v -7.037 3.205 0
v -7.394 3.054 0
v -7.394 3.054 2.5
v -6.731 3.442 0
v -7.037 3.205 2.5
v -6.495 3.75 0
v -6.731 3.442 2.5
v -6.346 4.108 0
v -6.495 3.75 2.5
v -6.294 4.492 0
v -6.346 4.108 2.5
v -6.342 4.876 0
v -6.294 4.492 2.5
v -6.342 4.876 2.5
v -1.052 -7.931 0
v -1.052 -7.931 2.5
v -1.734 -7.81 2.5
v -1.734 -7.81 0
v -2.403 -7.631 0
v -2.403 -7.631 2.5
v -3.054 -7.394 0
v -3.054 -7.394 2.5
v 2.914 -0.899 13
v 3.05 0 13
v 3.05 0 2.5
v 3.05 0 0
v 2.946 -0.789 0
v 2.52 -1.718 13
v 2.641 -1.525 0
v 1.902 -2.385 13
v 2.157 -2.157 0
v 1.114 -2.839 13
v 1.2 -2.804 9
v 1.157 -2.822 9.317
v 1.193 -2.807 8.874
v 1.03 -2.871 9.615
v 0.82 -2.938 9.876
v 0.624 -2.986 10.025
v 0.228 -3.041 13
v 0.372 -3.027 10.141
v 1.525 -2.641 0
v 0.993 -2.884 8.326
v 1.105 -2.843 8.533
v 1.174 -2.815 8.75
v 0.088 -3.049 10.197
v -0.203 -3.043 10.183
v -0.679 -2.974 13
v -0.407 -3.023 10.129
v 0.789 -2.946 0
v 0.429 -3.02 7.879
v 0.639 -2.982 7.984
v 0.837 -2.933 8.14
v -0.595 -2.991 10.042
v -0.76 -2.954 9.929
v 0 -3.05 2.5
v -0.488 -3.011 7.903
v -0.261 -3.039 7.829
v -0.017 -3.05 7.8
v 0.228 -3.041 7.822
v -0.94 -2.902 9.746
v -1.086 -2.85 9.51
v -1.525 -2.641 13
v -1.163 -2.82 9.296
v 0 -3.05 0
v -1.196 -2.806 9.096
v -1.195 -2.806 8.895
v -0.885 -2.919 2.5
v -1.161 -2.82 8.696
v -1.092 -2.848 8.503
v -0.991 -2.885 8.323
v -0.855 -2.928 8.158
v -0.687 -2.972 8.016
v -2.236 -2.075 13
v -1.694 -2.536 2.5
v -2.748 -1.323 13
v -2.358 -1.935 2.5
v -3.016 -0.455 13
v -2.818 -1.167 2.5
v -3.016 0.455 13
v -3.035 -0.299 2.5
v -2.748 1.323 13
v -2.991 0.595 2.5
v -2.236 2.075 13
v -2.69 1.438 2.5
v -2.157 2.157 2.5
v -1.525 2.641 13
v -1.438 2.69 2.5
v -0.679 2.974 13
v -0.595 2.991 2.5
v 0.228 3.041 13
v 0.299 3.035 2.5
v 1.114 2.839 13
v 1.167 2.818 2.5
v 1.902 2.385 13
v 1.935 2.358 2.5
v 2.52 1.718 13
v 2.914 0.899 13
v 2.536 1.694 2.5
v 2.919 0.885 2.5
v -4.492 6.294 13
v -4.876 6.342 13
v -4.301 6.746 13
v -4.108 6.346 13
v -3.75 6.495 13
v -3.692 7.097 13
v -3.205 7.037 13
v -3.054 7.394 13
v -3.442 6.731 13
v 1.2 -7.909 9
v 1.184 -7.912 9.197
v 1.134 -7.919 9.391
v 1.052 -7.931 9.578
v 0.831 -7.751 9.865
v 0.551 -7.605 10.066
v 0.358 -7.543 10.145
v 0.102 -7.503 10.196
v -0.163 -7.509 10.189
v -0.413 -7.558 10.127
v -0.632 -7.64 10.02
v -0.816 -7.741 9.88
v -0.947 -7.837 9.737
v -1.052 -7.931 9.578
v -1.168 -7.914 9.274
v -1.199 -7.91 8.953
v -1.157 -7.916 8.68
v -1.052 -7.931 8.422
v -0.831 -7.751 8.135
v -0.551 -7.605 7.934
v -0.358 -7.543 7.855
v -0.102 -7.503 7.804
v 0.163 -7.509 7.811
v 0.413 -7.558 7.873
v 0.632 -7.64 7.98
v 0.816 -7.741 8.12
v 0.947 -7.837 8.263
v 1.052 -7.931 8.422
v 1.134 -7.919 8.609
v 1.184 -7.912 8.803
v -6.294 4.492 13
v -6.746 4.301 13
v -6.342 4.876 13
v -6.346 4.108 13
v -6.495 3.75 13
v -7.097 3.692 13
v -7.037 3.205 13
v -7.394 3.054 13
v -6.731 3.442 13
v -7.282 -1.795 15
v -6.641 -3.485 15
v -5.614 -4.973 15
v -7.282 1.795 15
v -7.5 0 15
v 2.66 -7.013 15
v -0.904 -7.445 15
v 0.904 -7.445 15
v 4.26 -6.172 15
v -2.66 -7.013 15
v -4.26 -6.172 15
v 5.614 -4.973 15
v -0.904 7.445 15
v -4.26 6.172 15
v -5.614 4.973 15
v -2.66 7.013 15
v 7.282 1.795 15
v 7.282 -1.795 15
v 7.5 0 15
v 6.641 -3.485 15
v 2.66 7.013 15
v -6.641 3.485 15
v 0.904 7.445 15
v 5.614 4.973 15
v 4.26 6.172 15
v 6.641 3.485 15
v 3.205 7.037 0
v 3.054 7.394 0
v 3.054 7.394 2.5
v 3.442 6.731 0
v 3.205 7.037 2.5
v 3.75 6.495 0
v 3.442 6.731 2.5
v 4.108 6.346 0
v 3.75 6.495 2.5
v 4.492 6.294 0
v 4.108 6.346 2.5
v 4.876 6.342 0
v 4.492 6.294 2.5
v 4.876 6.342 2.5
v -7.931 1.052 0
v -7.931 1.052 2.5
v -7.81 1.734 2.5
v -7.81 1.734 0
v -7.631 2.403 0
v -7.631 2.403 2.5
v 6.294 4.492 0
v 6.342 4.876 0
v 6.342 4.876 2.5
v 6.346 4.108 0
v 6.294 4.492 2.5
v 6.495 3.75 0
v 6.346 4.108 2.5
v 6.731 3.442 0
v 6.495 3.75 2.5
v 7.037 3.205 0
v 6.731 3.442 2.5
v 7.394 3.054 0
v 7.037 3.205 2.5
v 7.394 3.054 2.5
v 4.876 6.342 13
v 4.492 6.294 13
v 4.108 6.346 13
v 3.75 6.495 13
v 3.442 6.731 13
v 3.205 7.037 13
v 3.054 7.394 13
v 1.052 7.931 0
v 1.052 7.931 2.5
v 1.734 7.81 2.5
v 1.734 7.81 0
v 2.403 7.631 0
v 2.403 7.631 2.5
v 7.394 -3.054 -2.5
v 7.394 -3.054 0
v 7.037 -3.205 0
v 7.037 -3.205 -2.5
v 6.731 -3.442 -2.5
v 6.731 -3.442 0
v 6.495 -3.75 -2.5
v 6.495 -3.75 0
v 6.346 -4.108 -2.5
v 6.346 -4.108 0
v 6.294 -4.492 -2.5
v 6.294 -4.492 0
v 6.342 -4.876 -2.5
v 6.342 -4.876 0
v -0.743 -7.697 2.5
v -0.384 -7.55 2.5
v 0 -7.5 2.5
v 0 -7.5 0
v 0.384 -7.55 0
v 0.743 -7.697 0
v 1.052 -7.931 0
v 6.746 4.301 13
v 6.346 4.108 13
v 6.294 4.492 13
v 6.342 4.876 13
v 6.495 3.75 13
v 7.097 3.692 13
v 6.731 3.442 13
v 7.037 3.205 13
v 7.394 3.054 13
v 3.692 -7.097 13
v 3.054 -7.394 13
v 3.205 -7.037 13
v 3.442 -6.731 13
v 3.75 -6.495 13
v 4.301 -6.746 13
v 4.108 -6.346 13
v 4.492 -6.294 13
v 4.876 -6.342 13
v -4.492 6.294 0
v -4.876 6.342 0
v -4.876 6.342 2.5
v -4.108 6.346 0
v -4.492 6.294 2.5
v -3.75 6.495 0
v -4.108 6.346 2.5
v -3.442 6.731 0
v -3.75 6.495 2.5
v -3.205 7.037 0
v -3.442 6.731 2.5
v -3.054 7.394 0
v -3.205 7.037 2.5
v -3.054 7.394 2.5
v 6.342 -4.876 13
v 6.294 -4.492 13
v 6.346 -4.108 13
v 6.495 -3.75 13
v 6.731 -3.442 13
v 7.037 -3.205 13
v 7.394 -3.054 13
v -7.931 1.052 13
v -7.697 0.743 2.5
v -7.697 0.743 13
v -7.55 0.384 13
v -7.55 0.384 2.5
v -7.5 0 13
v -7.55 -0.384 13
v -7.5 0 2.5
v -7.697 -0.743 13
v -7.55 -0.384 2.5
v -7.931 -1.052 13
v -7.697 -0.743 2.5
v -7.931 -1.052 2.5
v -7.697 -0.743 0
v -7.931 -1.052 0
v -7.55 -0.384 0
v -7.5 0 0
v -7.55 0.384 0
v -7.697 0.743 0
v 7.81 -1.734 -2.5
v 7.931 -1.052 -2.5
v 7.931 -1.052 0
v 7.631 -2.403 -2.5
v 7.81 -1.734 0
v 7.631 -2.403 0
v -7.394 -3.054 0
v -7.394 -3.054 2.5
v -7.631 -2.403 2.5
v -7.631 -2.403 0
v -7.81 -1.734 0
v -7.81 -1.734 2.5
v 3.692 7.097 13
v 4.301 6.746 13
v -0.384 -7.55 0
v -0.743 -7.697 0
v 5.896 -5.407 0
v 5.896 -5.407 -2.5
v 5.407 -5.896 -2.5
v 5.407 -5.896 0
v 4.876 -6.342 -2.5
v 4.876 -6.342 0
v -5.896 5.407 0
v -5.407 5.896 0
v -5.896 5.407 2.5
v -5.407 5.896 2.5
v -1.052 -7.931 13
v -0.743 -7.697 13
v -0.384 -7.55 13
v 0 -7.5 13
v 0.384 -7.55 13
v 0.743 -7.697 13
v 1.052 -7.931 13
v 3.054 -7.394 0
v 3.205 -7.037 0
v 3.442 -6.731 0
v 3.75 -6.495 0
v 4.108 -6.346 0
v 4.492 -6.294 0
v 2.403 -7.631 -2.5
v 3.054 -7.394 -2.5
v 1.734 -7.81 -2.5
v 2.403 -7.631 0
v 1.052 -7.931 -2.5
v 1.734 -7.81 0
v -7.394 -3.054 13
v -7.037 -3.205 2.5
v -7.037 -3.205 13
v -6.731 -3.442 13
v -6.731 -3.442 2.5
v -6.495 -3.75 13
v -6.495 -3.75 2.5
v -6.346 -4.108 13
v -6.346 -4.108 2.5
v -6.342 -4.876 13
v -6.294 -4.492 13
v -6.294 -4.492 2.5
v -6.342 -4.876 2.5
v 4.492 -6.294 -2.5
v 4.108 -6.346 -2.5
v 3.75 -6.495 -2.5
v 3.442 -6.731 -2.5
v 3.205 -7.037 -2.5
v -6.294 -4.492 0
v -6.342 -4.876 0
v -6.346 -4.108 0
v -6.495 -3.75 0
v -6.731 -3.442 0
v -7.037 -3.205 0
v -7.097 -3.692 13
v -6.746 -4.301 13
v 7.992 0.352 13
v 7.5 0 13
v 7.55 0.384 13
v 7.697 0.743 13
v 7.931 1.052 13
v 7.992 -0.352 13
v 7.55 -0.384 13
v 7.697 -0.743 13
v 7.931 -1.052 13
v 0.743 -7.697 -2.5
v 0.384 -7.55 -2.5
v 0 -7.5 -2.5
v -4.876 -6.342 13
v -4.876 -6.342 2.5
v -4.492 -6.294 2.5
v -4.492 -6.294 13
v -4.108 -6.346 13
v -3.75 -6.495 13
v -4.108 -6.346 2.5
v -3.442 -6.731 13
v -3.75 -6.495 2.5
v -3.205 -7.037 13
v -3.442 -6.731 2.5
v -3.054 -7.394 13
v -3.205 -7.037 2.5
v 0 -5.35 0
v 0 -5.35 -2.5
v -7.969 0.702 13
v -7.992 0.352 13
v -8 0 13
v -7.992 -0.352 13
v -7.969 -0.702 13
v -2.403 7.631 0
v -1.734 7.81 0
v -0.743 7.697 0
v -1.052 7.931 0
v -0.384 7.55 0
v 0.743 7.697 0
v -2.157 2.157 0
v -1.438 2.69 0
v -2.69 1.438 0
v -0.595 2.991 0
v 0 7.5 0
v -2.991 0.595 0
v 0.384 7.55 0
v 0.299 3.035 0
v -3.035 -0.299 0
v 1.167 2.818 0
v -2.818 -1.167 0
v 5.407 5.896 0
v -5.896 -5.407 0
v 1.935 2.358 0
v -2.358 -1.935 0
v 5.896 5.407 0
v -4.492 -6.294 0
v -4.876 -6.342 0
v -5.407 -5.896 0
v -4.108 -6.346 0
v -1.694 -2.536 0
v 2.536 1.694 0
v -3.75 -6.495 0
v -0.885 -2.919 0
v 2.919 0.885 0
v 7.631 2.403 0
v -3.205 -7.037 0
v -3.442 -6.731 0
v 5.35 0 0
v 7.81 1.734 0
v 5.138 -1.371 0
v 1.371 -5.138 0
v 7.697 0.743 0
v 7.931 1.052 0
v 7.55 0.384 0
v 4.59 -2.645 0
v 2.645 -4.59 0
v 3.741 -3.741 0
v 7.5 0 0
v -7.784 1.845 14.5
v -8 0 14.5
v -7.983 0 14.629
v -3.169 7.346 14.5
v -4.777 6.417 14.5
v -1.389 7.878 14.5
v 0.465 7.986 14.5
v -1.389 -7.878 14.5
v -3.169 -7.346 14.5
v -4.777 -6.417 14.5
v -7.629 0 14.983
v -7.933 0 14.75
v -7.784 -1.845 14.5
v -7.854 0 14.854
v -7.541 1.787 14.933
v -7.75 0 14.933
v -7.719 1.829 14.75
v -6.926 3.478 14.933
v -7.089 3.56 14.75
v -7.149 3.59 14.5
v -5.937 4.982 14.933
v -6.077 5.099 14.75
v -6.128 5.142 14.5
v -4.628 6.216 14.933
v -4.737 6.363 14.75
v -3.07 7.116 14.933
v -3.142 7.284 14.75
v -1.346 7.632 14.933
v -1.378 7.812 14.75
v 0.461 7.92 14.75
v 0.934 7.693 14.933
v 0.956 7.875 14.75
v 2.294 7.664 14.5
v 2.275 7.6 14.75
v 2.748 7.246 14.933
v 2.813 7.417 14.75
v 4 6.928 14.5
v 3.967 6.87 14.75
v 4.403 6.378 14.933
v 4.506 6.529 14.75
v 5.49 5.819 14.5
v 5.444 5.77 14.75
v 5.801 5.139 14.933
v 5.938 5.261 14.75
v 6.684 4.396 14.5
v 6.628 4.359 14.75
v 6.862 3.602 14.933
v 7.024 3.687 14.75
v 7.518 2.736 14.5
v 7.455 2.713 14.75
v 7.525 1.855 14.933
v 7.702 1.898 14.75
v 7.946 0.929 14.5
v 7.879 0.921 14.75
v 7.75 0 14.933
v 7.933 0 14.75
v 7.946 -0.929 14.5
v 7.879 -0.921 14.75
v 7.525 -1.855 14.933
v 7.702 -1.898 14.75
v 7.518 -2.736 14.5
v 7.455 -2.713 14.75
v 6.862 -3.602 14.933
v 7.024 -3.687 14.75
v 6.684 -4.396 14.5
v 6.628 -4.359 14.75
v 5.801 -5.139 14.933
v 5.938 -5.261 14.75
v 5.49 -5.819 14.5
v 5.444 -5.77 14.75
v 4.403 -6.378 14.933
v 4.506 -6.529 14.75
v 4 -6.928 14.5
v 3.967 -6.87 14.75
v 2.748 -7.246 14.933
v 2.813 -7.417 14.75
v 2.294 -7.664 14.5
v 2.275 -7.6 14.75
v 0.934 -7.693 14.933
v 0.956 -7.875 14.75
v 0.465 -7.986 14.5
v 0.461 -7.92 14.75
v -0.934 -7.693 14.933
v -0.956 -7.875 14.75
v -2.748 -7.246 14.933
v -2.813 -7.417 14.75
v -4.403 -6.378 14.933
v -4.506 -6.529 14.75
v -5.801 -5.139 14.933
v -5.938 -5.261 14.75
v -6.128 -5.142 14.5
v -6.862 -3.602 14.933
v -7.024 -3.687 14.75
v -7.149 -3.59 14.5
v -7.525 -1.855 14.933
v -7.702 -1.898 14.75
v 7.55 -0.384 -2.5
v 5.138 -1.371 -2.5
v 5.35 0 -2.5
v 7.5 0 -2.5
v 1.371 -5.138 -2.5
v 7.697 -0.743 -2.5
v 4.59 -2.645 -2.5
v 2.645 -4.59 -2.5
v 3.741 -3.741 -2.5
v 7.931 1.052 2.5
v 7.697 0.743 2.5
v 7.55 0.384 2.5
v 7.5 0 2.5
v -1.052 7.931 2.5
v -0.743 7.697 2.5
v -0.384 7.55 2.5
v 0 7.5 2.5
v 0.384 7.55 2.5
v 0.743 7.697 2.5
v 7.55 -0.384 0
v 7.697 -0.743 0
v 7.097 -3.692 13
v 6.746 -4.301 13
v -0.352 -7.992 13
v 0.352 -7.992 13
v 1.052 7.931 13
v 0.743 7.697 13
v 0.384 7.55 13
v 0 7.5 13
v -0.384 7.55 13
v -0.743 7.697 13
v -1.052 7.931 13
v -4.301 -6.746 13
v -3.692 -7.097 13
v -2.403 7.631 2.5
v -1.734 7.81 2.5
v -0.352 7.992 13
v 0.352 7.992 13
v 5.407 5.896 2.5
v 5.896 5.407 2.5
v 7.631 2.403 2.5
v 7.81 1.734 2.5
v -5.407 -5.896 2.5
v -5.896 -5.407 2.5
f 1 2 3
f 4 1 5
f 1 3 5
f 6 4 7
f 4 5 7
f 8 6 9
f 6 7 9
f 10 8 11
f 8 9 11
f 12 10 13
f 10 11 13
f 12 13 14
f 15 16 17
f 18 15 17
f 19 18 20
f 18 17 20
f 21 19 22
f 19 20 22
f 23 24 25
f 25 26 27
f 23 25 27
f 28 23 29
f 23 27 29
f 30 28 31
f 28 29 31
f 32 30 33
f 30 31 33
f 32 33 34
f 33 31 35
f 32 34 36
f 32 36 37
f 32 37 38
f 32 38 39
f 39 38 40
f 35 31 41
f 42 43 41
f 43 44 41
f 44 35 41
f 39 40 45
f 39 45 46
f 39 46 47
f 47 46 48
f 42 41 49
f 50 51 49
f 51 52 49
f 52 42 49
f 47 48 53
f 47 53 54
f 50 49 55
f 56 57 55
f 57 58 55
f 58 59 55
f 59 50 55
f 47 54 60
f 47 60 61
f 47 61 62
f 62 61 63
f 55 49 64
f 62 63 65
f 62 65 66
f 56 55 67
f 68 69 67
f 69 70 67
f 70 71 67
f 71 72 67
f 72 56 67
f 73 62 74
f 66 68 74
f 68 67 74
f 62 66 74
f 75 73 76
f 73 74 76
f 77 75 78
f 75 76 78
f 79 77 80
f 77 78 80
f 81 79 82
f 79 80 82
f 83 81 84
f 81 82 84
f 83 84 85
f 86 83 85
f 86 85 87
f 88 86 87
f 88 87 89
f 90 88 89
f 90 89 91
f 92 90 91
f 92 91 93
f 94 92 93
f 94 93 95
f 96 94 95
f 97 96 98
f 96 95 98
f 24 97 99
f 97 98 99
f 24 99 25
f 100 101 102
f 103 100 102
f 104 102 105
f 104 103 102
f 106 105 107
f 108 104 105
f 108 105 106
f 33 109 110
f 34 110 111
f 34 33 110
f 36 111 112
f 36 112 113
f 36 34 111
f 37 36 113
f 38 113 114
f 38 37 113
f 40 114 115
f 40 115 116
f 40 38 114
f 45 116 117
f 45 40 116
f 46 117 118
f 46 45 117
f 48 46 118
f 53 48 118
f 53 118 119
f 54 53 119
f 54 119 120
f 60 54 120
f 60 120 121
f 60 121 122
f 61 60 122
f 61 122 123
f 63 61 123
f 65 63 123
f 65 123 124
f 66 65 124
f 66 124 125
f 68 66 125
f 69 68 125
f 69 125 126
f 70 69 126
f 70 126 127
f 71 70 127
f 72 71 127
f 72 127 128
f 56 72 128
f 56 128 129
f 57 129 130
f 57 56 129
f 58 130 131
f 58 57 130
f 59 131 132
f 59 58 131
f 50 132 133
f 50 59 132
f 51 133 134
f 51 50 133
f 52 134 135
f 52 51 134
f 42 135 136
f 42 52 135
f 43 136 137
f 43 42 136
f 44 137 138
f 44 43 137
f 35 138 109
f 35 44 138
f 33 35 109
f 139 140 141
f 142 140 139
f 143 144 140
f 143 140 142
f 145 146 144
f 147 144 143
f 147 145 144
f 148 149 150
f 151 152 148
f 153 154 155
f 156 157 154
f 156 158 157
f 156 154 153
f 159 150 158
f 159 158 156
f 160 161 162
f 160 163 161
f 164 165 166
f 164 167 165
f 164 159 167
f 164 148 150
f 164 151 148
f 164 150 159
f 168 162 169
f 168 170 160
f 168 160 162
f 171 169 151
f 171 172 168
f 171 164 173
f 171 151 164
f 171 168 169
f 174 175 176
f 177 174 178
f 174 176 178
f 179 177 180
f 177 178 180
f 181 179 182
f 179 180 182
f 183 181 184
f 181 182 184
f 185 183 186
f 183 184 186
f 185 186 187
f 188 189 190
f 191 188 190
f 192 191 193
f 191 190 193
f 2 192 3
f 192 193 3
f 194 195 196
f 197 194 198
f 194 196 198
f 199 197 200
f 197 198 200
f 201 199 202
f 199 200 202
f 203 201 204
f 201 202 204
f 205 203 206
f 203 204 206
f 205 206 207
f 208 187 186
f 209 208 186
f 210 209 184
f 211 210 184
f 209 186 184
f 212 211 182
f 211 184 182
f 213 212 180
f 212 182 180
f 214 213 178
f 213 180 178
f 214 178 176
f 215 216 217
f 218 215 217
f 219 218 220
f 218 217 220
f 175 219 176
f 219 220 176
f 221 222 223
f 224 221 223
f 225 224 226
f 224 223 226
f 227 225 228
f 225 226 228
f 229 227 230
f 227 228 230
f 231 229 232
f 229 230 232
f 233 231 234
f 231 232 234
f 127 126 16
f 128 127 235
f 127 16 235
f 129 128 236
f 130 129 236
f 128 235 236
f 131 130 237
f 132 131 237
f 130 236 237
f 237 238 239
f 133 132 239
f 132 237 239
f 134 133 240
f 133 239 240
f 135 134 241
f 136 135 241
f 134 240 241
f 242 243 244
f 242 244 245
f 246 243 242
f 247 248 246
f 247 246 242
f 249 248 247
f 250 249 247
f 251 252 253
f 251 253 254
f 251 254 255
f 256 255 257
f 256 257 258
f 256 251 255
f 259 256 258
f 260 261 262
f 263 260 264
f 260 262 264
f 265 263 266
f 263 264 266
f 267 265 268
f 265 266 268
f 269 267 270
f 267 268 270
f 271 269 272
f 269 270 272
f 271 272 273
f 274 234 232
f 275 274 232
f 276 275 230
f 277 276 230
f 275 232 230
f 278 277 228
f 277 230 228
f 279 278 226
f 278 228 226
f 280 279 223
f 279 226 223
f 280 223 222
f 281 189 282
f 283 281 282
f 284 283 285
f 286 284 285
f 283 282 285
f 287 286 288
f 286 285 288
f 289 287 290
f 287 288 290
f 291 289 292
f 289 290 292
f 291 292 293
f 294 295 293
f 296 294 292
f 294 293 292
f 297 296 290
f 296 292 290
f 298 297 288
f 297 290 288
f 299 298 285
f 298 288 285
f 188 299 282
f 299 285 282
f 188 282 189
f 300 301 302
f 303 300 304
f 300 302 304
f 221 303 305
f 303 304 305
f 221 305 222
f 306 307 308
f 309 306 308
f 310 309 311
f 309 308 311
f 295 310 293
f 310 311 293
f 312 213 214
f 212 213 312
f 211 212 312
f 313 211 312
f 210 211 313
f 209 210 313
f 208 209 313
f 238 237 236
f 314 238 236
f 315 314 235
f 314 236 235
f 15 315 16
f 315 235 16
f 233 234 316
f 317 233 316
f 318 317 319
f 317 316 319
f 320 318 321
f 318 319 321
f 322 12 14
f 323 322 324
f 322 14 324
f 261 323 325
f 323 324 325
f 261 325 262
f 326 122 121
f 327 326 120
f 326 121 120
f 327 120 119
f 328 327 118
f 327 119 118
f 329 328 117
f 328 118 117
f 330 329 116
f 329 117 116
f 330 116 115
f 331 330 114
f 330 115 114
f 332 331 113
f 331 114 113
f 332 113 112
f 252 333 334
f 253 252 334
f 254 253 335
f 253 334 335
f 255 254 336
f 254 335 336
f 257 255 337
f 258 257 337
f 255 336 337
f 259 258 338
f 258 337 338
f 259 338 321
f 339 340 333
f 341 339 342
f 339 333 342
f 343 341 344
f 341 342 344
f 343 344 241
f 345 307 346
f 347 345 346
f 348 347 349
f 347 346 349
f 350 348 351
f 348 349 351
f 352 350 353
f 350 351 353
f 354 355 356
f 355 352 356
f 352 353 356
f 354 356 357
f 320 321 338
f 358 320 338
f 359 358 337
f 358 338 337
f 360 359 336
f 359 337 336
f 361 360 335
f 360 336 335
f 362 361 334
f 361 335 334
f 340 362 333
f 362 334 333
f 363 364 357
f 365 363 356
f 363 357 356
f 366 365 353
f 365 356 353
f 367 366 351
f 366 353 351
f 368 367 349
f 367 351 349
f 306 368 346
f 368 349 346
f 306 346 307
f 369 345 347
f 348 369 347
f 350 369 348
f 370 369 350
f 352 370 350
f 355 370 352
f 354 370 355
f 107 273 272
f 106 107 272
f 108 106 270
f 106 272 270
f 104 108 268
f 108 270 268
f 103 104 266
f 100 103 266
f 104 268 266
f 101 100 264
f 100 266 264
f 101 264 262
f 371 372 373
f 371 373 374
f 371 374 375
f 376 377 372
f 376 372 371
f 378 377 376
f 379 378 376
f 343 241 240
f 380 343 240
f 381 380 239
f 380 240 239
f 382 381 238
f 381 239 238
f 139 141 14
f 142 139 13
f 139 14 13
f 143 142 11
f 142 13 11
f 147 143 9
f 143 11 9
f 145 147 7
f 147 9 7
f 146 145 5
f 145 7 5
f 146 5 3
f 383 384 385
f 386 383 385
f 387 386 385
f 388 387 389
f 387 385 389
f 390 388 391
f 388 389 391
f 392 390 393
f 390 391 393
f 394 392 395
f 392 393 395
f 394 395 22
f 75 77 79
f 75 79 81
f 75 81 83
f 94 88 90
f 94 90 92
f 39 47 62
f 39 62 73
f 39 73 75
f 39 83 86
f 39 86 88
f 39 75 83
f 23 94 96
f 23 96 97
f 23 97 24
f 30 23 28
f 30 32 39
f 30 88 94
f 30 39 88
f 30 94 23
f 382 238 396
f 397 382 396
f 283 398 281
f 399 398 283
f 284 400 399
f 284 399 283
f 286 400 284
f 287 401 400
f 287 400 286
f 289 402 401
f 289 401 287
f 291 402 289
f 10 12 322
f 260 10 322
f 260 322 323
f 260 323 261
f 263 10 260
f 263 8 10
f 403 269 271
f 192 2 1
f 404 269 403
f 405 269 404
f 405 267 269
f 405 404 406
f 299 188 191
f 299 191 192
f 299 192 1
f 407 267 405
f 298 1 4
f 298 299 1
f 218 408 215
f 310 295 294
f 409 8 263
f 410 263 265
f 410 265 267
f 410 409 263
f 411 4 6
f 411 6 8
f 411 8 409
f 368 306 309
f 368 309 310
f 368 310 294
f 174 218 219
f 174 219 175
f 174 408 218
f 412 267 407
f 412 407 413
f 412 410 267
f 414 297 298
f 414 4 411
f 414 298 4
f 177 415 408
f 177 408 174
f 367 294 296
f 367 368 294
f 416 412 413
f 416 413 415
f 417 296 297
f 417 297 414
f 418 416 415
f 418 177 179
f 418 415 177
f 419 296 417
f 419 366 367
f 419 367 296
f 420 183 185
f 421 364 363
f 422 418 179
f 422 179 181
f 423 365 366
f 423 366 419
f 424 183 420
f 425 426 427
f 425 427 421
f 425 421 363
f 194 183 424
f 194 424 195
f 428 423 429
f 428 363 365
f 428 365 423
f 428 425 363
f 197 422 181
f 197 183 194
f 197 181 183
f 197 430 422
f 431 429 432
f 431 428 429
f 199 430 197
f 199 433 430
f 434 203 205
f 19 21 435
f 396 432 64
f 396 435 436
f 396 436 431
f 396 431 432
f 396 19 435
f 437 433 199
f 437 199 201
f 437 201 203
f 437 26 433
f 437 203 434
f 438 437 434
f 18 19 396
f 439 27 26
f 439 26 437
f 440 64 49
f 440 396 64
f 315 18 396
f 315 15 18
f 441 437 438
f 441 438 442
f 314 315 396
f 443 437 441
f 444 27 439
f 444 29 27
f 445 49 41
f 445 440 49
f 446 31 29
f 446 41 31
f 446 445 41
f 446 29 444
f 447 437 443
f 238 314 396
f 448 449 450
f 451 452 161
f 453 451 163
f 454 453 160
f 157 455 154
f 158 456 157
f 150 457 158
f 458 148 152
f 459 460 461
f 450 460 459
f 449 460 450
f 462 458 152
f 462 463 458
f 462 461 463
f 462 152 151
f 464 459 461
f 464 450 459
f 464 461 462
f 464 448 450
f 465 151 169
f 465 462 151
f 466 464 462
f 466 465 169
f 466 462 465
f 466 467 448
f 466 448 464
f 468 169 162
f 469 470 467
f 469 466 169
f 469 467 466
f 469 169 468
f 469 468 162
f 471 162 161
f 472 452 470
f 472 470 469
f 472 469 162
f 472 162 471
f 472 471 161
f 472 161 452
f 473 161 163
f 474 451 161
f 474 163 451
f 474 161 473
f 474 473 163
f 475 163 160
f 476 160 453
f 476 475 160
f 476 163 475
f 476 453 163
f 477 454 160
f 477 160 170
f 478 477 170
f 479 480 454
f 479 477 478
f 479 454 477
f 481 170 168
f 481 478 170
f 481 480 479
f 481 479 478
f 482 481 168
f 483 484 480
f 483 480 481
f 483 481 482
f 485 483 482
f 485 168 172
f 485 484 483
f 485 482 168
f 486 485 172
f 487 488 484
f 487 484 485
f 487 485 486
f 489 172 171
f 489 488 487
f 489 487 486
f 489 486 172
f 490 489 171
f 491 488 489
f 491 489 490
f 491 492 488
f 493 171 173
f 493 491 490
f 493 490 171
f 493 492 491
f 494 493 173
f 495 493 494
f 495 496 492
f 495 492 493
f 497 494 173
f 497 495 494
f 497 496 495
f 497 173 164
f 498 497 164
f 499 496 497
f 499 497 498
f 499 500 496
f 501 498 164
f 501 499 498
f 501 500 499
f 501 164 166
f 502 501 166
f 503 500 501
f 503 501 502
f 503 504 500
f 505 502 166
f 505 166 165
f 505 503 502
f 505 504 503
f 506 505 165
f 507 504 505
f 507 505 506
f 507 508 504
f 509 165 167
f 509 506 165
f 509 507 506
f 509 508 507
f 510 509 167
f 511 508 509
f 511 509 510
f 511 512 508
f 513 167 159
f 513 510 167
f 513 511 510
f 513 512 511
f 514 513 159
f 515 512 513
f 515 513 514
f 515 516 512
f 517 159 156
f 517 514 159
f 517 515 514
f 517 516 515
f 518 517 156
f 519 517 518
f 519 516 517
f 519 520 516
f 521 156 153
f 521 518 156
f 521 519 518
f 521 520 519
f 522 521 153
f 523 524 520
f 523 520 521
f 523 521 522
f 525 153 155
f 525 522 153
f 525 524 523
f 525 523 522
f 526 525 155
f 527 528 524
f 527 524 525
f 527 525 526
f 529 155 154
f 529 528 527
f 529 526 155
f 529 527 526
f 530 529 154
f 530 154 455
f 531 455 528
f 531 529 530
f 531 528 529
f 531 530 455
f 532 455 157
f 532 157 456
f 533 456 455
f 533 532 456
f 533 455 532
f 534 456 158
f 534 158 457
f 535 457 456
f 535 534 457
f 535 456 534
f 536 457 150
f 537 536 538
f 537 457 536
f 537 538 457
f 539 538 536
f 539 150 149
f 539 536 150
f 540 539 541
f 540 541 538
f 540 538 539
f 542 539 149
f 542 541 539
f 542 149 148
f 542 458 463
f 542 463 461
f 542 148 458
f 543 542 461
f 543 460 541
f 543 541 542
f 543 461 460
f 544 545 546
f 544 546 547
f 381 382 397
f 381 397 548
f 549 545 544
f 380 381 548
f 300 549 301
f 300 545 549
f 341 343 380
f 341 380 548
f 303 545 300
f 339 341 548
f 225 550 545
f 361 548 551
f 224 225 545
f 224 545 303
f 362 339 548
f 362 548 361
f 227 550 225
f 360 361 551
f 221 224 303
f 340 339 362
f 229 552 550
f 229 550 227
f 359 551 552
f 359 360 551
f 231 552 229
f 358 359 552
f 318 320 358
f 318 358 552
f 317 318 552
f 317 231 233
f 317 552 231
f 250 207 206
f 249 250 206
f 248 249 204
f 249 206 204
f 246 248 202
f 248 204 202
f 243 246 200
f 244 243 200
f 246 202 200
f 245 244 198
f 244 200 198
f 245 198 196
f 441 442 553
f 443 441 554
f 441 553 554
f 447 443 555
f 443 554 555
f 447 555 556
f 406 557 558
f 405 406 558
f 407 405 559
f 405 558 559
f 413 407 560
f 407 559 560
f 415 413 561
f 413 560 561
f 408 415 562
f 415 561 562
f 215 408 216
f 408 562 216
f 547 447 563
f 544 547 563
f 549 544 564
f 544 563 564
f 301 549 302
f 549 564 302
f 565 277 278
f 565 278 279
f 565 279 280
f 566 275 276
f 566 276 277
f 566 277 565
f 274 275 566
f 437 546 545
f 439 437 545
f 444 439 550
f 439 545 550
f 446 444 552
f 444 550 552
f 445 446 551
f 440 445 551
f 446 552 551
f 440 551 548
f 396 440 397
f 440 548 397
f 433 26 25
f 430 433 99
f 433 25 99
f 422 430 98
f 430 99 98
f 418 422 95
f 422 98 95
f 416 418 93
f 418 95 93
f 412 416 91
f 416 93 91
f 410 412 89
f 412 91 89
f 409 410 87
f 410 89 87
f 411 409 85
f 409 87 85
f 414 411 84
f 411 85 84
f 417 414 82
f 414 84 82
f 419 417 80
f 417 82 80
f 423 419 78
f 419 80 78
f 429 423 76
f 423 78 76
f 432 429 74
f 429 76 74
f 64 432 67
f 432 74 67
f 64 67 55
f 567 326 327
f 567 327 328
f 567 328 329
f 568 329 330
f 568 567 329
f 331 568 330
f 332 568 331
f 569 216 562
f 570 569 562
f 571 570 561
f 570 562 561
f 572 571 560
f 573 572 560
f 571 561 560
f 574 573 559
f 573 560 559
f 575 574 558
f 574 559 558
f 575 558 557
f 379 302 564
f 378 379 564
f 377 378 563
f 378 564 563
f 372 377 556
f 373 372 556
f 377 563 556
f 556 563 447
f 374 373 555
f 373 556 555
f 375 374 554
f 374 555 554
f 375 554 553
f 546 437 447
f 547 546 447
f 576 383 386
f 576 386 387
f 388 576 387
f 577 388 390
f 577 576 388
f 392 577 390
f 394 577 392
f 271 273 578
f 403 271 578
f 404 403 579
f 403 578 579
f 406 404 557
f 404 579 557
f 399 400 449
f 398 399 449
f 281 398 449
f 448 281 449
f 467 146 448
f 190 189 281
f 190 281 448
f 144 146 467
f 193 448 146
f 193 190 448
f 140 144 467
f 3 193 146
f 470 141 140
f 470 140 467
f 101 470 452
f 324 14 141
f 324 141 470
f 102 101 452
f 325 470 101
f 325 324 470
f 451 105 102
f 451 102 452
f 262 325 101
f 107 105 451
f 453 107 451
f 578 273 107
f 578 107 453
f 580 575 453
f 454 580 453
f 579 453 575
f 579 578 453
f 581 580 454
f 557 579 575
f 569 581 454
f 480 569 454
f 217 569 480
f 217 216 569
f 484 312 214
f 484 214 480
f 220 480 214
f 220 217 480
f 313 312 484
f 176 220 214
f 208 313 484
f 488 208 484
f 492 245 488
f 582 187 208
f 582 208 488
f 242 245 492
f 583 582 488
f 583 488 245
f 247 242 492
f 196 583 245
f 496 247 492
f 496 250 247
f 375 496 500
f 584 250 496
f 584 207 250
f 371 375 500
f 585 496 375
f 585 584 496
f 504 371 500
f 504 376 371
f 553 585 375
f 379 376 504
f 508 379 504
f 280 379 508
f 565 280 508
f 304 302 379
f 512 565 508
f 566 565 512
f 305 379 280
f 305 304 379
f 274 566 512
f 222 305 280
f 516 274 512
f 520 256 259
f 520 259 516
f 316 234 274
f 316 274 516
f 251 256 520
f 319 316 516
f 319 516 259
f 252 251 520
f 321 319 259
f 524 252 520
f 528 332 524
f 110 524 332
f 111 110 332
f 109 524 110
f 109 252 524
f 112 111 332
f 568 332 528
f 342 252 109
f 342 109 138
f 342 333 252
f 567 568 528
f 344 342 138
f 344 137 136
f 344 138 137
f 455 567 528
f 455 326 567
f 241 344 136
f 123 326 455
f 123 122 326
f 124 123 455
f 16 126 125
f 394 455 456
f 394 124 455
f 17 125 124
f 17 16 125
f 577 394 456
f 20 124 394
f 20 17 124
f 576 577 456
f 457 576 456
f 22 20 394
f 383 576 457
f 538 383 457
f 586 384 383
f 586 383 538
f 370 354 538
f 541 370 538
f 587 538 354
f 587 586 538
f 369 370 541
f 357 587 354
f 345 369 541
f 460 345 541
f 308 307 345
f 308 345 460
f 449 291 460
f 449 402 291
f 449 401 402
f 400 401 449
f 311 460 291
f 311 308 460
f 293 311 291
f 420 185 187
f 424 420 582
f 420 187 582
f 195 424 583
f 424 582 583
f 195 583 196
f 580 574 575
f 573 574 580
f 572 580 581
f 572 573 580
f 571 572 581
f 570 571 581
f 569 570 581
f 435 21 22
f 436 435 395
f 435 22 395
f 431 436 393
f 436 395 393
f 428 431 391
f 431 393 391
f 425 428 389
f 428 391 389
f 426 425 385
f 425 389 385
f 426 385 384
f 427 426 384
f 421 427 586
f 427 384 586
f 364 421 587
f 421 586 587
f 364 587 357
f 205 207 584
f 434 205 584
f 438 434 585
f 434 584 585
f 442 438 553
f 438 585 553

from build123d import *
from build123d import SkipClean  # not in build123d's __all__

# Parameters (mm, degrees)
F2_R      = 3.05
F3_DEPTH  = 13
F4_R      = 0.5
F5_R      = 1.2
F6_DEPTH  = 10
F7_R      = 1.5
F8_DEPTH  = 13
F10_DEPTH = 2.5
F11_DEPTH = 2.5
F13_DEPTH = 2.5


# Not quite as in the source:
# - after a boolean that leaves OpenCascade's solid faulty, fix() repairs it


with BuildPart() as f1:
    # F0 (on Front) → F1 (revolve)
    with BuildSketch(Plane.XZ):
        Polygon((-5, 0), (0, 0), (0, 15), (-8, 15), (-8, 0), align=None)
    revolve(axis=Axis((0, 0, -3.6677676575), (0, 0, -1)))

    # F2 (on face) → F3 (cut)
    with BuildSketch(Plane(origin=(0, 0, 0), x_dir=(1, 0, 0), z_dir=(0, 0, -1))):
        Circle(F2_R)
    extrude(amount=-F3_DEPTH, mode=Mode.SUBTRACT)

    # F4
    f4_edges = [f1.edges().sort_by_distance(p)[0] for p in [
        (8, 0, 15),
    ]]
    fillet(f4_edges, radius=F4_R)

    # F5 (on Front) → F6 (cut)
    with BuildSketch(Plane.XZ):
        with Locations((0, 9)):
            Circle(F5_R)
    extrude(amount=F6_DEPTH, mode=Mode.SUBTRACT)

    # F7 (on face) → F8 (cut)
    with BuildSketch(Plane(origin=(0, 0, 0), x_dir=(1, 0, 0), z_dir=(0, 0, -1))):
        with Locations((-9, 0)):
            Circle(F7_R)
        with Locations((-7.7942286341, -4.5)):
            Circle(F7_R)
        with Locations((-4.5, -7.7942286341)):
            Circle(F7_R)
        with Locations((0, -9)):
            Circle(F7_R)
        with Locations((4.5, -7.7942286341)):
            Circle(F7_R)
        with Locations((7.7942286341, -4.5)):
            Circle(F7_R)
        with Locations((9, 0)):
            Circle(F7_R)
        with Locations((7.7942286341, 4.5)):
            Circle(F7_R)
        with Locations((4.5, 7.7942286341)):
            Circle(F7_R)
        with Locations((0, 9)):
            Circle(F7_R)
        with Locations((-4.5, 7.7942286341)):
            Circle(F7_R)
        with Locations((-7.7942286341, 4.5)):
            Circle(F7_R)
    extrude(amount=-F8_DEPTH, mode=Mode.SUBTRACT)

    # F9 (on face) → F10 (cut)
    with BuildSketch(Plane(origin=(0, 0, 0), x_dir=(1, 0, 0), z_dir=(0, 0, -1))):
        with BuildLine():
            Line((8, 0), (0, 0))
            Line((0, 0), (0, 8))
            ThreePointArc((0, 8), (-5.6568542495, -5.6568542495), (8, 0))
        make_face()
    extrude(amount=-F10_DEPTH, mode=Mode.SUBTRACT)

    # F10_face (on face) + F1_face (on face) → F11 (join)
    with BuildSketch(Plane(origin=(-1.2304392028, 1.2304392022, 2.5), x_dir=(1, 0, 0), z_dir=(0, 0, -1))):
        with BuildLine():
            Line((8.7304392028, 1.2304392022), (4.2804392028, 1.2304392022))
            ThreePointArc((4.2804392028, 1.2304392022), (-0.9262364799, -0.9262364804), (1.2304392028, 4.2804392022))
            Line((1.2304392028, 4.2804392022), (1.2304392028, 8.7304392022))
            ThreePointArc((1.2304392028, 8.7304392022), (0.6621816316, 8.8422449317), (0.1786366634, 9.1609947585))
            ThreePointArc((0.1786366641, 9.1609947578), (-0.8401131581, 8.9578458126), (-1.8239508568, 8.6244030488))
            ThreePointArc((-1.8239508568, 8.6244030488), (-2.5195607972, 7.7256297306), (-3.6457262932, 7.5726005102))
            ThreePointArc((-3.6457262932, 7.5726005102), (-4.4264150467, 6.8872934517), (-5.1117221052, 6.1066046982))
            ThreePointArc((-5.1117221052, 6.1066046982), (-5.2647513256, 4.9804392022), (-6.1635246438, 4.2848292618))
            ThreePointArc((-6.1635246438, 4.2848292618), (-6.4969674076, 3.3009915631), (-6.7001163528, 2.2822417409))
            ThreePointArc((-6.7001163528, 2.2822417409), (-6.2695607972, 1.2304392022), (-6.7001163528, 0.1786366636))
            ThreePointArc((-6.7001163528, 0.1786366636), (-6.4969674076, -0.8401131586), (-6.1635246438, -1.8239508573))
            ThreePointArc((-6.1635246438, -1.8239508573), (-5.2647513256, -2.5195607978), (-5.1117221052, -3.6457262937))
            ThreePointArc((-5.1117221052, -3.6457262937), (-4.4264150467, -4.4264150472), (-3.6457262932, -5.1117221057))
            ThreePointArc((-3.6457262932, -5.1117221057), (-2.5195607972, -5.2647513261), (-1.8239508568, -6.1635246443))
            ThreePointArc((-1.8239508568, -6.1635246443), (-0.8401131581, -6.4969674081), (0.1786366641, -6.7001163533))
            ThreePointArc((0.1786366641, -6.7001163533), (1.2304392028, -6.2695607978), (2.2822417414, -6.7001163533))
            ThreePointArc((2.2822417414, -6.7001163533), (3.3009915636, -6.4969674081), (4.2848292623, -6.1635246443))
            ThreePointArc((4.2848292623, -6.1635246443), (4.9804392028, -5.2647513261), (6.1066046987, -5.1117221057))
            ThreePointArc((6.1066046987, -5.1117221057), (6.8872934522, -4.4264150472), (7.5726005107, -3.6457262937))
            ThreePointArc((7.5726005107, -3.6457262937), (7.7256297311, -2.5195607978), (8.6244030493, -1.8239508573))
            ThreePointArc((8.6244030493, -1.8239508573), (8.9578458131, -0.8401131586), (9.1609947583, 0.1786366636))
            ThreePointArc((9.1609947583, 0.1786366636), (8.842244932, 0.6621816315), (8.7304392028, 1.2304392022))
        make_face()
    with BuildSketch(Plane(origin=(0, 0, 0), x_dir=(1, 0, 0), z_dir=(0, 0, -1))):
        with BuildLine():
            ThreePointArc((1.0518025386, 7.9305555556), (0.5682575707, 7.6118057293), (0, 7.5))
            Line((0, 7.5), (0, 3.05))
            ThreePointArc((0, 3.05), (2.1566756826, 2.1566756826), (3.05, 0))
            Line((3.05, 0), (7.5, 0))
            ThreePointArc((7.5, 0), (7.6118057293, 0.5682575707), (7.9305555556, 1.0518025386))
            ThreePointArc((7.9305555556, 1.0518025386), (7.7274066103, 2.0705523608), (7.3939638465, 3.0543900596))
            ThreePointArc((7.3939638465, 3.0543900596), (6.4951905284, 3.75), (6.3421613079, 4.876165496))
            ThreePointArc((6.3421613079, 4.876165496), (5.6568542495, 5.6568542495), (4.876165496, 6.3421613079))
            ThreePointArc((4.876165496, 6.3421613079), (3.75, 6.4951905284), (3.0543900596, 7.3939638465))
            ThreePointArc((3.0543900596, 7.3939638465), (2.0705523608, 7.7274066103), (1.0518025386, 7.9305555556))
        make_face()
    with SkipClean():  # cleaning this boolean's faces spoils the solid; the shape is the same uncleaned
        extrude(amount=F11_DEPTH)

    # F12 (on face) → F13 (cut)
    with BuildSketch(Plane(origin=(0, 0, -2.5), x_dir=(1, 0, 0), z_dir=(0, 0, -1))):
        with BuildLine():
            ThreePointArc((0, 3.05), (2.1566756826, 2.1566756826), (3.05, 0))
            Line((3.05, 0), (5.35, 0))
            ThreePointArc((5.35, 0), (3.7410791492, 3.7410791492), (0, 5.35))
            Line((0, 5.35), (0, 3.05))
        make_face()
    extrude(amount=-F13_DEPTH, mode=Mode.SUBTRACT)

    add(f1.part.fix(), mode=Mode.REPLACE)


solid = f1.part
